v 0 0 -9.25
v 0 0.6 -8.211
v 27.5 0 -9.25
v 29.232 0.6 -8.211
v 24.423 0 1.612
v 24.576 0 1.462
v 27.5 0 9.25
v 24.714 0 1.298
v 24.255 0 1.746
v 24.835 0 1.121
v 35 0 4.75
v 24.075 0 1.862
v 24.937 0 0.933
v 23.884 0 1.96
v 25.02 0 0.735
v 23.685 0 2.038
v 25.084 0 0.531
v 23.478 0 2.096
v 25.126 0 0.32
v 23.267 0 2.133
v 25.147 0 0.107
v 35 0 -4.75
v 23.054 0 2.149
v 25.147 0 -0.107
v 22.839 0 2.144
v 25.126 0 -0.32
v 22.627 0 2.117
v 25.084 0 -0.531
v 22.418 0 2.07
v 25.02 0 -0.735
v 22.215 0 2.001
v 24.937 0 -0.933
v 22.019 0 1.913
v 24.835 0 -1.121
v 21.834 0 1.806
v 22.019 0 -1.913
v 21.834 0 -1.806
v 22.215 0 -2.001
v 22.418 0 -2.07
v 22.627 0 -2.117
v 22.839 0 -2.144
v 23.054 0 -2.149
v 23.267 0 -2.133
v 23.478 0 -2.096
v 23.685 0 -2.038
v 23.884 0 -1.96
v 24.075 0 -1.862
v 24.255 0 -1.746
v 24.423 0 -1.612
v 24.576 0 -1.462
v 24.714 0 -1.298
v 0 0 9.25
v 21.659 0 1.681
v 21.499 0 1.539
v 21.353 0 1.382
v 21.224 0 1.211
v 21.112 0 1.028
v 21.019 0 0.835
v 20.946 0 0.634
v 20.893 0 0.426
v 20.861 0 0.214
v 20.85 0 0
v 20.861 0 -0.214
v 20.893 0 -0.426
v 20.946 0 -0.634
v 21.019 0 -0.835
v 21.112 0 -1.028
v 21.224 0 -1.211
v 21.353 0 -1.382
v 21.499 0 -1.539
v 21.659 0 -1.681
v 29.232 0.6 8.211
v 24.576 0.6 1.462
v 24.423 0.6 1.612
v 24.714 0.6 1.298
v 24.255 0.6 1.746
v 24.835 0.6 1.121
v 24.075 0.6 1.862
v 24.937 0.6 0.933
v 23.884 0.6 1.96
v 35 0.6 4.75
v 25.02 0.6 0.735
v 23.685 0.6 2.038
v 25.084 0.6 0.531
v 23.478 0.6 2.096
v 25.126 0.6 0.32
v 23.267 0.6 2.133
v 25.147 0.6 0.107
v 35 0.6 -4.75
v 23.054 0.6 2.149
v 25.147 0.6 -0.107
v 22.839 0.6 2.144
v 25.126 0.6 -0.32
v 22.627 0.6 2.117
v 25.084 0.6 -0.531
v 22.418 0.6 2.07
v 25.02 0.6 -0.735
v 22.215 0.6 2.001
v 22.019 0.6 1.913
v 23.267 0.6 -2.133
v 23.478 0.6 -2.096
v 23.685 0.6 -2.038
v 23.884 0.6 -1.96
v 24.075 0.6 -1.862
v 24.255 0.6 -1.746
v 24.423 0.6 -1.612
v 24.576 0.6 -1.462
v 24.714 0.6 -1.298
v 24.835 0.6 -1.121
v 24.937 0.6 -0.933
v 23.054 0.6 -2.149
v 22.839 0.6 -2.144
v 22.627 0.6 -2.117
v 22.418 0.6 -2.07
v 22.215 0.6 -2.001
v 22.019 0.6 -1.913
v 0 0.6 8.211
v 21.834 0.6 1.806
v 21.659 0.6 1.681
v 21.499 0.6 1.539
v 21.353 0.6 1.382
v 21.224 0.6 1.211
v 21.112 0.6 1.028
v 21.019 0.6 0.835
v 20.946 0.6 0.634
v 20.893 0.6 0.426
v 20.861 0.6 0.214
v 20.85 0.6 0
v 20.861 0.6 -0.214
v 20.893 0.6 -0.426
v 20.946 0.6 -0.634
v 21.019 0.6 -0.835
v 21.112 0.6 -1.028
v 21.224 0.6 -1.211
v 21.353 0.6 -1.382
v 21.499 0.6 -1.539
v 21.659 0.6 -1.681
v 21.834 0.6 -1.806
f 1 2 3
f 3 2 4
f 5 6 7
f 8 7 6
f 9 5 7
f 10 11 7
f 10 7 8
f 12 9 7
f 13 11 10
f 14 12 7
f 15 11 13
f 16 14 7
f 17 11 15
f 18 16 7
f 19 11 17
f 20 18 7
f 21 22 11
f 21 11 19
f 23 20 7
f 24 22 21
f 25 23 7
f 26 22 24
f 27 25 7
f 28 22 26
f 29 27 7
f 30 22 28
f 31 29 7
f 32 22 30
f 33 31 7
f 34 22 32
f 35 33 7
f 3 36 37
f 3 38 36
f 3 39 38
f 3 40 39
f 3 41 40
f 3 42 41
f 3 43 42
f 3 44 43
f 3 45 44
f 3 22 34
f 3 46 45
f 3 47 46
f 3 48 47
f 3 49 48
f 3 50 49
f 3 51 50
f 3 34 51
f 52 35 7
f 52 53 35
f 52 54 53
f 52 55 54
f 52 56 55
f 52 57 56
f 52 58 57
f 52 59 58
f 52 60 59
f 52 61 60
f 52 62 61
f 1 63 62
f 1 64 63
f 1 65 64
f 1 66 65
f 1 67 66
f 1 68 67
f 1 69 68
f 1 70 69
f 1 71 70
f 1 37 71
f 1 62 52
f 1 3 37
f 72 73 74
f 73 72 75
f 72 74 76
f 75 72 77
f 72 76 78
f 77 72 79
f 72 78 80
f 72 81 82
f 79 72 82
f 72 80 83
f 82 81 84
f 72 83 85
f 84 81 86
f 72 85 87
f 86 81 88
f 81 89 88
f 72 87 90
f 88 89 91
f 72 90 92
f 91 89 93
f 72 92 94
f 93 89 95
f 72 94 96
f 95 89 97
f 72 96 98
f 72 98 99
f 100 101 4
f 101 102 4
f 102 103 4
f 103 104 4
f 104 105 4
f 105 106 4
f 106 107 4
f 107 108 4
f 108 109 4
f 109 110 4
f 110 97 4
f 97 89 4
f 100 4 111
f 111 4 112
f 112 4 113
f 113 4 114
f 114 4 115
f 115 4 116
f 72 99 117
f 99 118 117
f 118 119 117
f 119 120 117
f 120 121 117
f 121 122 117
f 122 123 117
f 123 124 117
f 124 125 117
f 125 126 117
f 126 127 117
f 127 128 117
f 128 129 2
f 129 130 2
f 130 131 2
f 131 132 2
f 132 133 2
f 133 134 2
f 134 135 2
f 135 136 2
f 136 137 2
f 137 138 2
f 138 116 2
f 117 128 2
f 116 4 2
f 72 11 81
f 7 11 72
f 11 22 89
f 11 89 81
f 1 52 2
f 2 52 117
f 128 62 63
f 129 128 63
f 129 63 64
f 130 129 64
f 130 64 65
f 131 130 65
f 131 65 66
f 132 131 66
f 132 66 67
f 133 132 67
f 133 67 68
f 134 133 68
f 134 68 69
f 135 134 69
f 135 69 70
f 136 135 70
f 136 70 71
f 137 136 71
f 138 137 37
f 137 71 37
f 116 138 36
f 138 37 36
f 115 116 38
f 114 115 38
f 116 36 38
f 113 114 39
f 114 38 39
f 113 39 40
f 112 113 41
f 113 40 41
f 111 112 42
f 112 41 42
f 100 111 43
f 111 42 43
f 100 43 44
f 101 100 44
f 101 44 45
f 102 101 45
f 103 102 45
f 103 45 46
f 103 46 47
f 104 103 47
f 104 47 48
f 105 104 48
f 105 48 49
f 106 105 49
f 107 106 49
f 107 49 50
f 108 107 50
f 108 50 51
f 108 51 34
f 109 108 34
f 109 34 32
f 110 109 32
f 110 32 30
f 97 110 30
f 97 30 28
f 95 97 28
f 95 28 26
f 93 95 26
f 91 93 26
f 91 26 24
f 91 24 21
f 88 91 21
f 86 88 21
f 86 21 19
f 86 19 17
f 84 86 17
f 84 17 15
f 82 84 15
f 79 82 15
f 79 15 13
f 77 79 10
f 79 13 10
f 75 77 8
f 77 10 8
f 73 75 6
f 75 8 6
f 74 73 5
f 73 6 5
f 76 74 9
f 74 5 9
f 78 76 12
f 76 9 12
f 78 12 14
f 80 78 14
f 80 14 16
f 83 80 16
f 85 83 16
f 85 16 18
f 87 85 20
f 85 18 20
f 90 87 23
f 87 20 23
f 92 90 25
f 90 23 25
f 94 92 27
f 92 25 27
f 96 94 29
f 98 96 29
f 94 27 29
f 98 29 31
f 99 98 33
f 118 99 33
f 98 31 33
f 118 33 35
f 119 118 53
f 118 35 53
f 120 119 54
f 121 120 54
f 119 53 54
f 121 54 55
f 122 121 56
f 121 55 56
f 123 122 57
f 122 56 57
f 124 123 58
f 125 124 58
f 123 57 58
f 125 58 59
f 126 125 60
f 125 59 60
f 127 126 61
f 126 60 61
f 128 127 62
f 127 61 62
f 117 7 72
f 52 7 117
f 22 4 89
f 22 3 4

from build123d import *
from OCP.BRepFilletAPI import BRepFilletAPI_MakeChamfer

# Parameters (mm, degrees)
BOSS_EXTRU_1_DEPTH = 0.6
D_GAGEMENT_M41_D   = 4.3
CHANFREIN1_SIZE    = 0.6
CHANFREIN1_SIZE_2  = 1.039230485


with BuildPart() as part:
    # Esquisse1 → Boss.-Extru.1 (new body)
    with BuildSketch(Plane(origin=(0, 0, 0), x_dir=(1, 0, 0), z_dir=(0, 1, 0))):
        Polygon((27.5, 9.25), (35, 4.75), (35, -4.75), (27.5, -9.25), (0, -9.25), (0, 9.25), align=None)
    extrude(amount=BOSS_EXTRU_1_DEPTH)

    # Dégagement M41 (through all)
    with Locations(Plane(origin=(0, 0.6, 0), x_dir=(1, 0, 0), z_dir=(0, 1, 0))):
        with Locations((23, 0)):
            Hole(D_GAGEMENT_M41_D / 2)

    # Chanfrein1
    chanfrein1_edges_1 = [part.edges().sort_by_distance(p)[0] for p in [
        (13.75, 0.6, -9.25),
    ]]
    chanfrein1_side_1 = [part.faces().sort_by_distance(p)[0] for p in [
        (13.75, 0.588, -9.25),
    ]]
    chanfrein1_edges_2 = [part.edges().sort_by_distance(p)[0] for p in [
        (13.75, 0.6, 9.25),
    ]]
    chanfrein1_side_2 = [part.faces().sort_by_distance(p)[0] for p in [
        (13.75, 0.6, 9.238),
    ]]
    chanfrein1 = BRepFilletAPI_MakeChamfer(part.part.solid().wrapped)
    for e in chanfrein1_edges_1:
        chanfrein1.Add(CHANFREIN1_SIZE - 0.0001, CHANFREIN1_SIZE_2 - 0.0001, e.wrapped, chanfrein1_side_1[0].wrapped)
    for e in chanfrein1_edges_2:
        chanfrein1.Add(CHANFREIN1_SIZE_2 - 0.0001, CHANFREIN1_SIZE - 0.0001, e.wrapped, chanfrein1_side_2[0].wrapped)
    add(Compound.cast(chanfrein1.Shape()), mode=Mode.REPLACE)  # a hair under: the kernel refuses the full size


solid = part.part
